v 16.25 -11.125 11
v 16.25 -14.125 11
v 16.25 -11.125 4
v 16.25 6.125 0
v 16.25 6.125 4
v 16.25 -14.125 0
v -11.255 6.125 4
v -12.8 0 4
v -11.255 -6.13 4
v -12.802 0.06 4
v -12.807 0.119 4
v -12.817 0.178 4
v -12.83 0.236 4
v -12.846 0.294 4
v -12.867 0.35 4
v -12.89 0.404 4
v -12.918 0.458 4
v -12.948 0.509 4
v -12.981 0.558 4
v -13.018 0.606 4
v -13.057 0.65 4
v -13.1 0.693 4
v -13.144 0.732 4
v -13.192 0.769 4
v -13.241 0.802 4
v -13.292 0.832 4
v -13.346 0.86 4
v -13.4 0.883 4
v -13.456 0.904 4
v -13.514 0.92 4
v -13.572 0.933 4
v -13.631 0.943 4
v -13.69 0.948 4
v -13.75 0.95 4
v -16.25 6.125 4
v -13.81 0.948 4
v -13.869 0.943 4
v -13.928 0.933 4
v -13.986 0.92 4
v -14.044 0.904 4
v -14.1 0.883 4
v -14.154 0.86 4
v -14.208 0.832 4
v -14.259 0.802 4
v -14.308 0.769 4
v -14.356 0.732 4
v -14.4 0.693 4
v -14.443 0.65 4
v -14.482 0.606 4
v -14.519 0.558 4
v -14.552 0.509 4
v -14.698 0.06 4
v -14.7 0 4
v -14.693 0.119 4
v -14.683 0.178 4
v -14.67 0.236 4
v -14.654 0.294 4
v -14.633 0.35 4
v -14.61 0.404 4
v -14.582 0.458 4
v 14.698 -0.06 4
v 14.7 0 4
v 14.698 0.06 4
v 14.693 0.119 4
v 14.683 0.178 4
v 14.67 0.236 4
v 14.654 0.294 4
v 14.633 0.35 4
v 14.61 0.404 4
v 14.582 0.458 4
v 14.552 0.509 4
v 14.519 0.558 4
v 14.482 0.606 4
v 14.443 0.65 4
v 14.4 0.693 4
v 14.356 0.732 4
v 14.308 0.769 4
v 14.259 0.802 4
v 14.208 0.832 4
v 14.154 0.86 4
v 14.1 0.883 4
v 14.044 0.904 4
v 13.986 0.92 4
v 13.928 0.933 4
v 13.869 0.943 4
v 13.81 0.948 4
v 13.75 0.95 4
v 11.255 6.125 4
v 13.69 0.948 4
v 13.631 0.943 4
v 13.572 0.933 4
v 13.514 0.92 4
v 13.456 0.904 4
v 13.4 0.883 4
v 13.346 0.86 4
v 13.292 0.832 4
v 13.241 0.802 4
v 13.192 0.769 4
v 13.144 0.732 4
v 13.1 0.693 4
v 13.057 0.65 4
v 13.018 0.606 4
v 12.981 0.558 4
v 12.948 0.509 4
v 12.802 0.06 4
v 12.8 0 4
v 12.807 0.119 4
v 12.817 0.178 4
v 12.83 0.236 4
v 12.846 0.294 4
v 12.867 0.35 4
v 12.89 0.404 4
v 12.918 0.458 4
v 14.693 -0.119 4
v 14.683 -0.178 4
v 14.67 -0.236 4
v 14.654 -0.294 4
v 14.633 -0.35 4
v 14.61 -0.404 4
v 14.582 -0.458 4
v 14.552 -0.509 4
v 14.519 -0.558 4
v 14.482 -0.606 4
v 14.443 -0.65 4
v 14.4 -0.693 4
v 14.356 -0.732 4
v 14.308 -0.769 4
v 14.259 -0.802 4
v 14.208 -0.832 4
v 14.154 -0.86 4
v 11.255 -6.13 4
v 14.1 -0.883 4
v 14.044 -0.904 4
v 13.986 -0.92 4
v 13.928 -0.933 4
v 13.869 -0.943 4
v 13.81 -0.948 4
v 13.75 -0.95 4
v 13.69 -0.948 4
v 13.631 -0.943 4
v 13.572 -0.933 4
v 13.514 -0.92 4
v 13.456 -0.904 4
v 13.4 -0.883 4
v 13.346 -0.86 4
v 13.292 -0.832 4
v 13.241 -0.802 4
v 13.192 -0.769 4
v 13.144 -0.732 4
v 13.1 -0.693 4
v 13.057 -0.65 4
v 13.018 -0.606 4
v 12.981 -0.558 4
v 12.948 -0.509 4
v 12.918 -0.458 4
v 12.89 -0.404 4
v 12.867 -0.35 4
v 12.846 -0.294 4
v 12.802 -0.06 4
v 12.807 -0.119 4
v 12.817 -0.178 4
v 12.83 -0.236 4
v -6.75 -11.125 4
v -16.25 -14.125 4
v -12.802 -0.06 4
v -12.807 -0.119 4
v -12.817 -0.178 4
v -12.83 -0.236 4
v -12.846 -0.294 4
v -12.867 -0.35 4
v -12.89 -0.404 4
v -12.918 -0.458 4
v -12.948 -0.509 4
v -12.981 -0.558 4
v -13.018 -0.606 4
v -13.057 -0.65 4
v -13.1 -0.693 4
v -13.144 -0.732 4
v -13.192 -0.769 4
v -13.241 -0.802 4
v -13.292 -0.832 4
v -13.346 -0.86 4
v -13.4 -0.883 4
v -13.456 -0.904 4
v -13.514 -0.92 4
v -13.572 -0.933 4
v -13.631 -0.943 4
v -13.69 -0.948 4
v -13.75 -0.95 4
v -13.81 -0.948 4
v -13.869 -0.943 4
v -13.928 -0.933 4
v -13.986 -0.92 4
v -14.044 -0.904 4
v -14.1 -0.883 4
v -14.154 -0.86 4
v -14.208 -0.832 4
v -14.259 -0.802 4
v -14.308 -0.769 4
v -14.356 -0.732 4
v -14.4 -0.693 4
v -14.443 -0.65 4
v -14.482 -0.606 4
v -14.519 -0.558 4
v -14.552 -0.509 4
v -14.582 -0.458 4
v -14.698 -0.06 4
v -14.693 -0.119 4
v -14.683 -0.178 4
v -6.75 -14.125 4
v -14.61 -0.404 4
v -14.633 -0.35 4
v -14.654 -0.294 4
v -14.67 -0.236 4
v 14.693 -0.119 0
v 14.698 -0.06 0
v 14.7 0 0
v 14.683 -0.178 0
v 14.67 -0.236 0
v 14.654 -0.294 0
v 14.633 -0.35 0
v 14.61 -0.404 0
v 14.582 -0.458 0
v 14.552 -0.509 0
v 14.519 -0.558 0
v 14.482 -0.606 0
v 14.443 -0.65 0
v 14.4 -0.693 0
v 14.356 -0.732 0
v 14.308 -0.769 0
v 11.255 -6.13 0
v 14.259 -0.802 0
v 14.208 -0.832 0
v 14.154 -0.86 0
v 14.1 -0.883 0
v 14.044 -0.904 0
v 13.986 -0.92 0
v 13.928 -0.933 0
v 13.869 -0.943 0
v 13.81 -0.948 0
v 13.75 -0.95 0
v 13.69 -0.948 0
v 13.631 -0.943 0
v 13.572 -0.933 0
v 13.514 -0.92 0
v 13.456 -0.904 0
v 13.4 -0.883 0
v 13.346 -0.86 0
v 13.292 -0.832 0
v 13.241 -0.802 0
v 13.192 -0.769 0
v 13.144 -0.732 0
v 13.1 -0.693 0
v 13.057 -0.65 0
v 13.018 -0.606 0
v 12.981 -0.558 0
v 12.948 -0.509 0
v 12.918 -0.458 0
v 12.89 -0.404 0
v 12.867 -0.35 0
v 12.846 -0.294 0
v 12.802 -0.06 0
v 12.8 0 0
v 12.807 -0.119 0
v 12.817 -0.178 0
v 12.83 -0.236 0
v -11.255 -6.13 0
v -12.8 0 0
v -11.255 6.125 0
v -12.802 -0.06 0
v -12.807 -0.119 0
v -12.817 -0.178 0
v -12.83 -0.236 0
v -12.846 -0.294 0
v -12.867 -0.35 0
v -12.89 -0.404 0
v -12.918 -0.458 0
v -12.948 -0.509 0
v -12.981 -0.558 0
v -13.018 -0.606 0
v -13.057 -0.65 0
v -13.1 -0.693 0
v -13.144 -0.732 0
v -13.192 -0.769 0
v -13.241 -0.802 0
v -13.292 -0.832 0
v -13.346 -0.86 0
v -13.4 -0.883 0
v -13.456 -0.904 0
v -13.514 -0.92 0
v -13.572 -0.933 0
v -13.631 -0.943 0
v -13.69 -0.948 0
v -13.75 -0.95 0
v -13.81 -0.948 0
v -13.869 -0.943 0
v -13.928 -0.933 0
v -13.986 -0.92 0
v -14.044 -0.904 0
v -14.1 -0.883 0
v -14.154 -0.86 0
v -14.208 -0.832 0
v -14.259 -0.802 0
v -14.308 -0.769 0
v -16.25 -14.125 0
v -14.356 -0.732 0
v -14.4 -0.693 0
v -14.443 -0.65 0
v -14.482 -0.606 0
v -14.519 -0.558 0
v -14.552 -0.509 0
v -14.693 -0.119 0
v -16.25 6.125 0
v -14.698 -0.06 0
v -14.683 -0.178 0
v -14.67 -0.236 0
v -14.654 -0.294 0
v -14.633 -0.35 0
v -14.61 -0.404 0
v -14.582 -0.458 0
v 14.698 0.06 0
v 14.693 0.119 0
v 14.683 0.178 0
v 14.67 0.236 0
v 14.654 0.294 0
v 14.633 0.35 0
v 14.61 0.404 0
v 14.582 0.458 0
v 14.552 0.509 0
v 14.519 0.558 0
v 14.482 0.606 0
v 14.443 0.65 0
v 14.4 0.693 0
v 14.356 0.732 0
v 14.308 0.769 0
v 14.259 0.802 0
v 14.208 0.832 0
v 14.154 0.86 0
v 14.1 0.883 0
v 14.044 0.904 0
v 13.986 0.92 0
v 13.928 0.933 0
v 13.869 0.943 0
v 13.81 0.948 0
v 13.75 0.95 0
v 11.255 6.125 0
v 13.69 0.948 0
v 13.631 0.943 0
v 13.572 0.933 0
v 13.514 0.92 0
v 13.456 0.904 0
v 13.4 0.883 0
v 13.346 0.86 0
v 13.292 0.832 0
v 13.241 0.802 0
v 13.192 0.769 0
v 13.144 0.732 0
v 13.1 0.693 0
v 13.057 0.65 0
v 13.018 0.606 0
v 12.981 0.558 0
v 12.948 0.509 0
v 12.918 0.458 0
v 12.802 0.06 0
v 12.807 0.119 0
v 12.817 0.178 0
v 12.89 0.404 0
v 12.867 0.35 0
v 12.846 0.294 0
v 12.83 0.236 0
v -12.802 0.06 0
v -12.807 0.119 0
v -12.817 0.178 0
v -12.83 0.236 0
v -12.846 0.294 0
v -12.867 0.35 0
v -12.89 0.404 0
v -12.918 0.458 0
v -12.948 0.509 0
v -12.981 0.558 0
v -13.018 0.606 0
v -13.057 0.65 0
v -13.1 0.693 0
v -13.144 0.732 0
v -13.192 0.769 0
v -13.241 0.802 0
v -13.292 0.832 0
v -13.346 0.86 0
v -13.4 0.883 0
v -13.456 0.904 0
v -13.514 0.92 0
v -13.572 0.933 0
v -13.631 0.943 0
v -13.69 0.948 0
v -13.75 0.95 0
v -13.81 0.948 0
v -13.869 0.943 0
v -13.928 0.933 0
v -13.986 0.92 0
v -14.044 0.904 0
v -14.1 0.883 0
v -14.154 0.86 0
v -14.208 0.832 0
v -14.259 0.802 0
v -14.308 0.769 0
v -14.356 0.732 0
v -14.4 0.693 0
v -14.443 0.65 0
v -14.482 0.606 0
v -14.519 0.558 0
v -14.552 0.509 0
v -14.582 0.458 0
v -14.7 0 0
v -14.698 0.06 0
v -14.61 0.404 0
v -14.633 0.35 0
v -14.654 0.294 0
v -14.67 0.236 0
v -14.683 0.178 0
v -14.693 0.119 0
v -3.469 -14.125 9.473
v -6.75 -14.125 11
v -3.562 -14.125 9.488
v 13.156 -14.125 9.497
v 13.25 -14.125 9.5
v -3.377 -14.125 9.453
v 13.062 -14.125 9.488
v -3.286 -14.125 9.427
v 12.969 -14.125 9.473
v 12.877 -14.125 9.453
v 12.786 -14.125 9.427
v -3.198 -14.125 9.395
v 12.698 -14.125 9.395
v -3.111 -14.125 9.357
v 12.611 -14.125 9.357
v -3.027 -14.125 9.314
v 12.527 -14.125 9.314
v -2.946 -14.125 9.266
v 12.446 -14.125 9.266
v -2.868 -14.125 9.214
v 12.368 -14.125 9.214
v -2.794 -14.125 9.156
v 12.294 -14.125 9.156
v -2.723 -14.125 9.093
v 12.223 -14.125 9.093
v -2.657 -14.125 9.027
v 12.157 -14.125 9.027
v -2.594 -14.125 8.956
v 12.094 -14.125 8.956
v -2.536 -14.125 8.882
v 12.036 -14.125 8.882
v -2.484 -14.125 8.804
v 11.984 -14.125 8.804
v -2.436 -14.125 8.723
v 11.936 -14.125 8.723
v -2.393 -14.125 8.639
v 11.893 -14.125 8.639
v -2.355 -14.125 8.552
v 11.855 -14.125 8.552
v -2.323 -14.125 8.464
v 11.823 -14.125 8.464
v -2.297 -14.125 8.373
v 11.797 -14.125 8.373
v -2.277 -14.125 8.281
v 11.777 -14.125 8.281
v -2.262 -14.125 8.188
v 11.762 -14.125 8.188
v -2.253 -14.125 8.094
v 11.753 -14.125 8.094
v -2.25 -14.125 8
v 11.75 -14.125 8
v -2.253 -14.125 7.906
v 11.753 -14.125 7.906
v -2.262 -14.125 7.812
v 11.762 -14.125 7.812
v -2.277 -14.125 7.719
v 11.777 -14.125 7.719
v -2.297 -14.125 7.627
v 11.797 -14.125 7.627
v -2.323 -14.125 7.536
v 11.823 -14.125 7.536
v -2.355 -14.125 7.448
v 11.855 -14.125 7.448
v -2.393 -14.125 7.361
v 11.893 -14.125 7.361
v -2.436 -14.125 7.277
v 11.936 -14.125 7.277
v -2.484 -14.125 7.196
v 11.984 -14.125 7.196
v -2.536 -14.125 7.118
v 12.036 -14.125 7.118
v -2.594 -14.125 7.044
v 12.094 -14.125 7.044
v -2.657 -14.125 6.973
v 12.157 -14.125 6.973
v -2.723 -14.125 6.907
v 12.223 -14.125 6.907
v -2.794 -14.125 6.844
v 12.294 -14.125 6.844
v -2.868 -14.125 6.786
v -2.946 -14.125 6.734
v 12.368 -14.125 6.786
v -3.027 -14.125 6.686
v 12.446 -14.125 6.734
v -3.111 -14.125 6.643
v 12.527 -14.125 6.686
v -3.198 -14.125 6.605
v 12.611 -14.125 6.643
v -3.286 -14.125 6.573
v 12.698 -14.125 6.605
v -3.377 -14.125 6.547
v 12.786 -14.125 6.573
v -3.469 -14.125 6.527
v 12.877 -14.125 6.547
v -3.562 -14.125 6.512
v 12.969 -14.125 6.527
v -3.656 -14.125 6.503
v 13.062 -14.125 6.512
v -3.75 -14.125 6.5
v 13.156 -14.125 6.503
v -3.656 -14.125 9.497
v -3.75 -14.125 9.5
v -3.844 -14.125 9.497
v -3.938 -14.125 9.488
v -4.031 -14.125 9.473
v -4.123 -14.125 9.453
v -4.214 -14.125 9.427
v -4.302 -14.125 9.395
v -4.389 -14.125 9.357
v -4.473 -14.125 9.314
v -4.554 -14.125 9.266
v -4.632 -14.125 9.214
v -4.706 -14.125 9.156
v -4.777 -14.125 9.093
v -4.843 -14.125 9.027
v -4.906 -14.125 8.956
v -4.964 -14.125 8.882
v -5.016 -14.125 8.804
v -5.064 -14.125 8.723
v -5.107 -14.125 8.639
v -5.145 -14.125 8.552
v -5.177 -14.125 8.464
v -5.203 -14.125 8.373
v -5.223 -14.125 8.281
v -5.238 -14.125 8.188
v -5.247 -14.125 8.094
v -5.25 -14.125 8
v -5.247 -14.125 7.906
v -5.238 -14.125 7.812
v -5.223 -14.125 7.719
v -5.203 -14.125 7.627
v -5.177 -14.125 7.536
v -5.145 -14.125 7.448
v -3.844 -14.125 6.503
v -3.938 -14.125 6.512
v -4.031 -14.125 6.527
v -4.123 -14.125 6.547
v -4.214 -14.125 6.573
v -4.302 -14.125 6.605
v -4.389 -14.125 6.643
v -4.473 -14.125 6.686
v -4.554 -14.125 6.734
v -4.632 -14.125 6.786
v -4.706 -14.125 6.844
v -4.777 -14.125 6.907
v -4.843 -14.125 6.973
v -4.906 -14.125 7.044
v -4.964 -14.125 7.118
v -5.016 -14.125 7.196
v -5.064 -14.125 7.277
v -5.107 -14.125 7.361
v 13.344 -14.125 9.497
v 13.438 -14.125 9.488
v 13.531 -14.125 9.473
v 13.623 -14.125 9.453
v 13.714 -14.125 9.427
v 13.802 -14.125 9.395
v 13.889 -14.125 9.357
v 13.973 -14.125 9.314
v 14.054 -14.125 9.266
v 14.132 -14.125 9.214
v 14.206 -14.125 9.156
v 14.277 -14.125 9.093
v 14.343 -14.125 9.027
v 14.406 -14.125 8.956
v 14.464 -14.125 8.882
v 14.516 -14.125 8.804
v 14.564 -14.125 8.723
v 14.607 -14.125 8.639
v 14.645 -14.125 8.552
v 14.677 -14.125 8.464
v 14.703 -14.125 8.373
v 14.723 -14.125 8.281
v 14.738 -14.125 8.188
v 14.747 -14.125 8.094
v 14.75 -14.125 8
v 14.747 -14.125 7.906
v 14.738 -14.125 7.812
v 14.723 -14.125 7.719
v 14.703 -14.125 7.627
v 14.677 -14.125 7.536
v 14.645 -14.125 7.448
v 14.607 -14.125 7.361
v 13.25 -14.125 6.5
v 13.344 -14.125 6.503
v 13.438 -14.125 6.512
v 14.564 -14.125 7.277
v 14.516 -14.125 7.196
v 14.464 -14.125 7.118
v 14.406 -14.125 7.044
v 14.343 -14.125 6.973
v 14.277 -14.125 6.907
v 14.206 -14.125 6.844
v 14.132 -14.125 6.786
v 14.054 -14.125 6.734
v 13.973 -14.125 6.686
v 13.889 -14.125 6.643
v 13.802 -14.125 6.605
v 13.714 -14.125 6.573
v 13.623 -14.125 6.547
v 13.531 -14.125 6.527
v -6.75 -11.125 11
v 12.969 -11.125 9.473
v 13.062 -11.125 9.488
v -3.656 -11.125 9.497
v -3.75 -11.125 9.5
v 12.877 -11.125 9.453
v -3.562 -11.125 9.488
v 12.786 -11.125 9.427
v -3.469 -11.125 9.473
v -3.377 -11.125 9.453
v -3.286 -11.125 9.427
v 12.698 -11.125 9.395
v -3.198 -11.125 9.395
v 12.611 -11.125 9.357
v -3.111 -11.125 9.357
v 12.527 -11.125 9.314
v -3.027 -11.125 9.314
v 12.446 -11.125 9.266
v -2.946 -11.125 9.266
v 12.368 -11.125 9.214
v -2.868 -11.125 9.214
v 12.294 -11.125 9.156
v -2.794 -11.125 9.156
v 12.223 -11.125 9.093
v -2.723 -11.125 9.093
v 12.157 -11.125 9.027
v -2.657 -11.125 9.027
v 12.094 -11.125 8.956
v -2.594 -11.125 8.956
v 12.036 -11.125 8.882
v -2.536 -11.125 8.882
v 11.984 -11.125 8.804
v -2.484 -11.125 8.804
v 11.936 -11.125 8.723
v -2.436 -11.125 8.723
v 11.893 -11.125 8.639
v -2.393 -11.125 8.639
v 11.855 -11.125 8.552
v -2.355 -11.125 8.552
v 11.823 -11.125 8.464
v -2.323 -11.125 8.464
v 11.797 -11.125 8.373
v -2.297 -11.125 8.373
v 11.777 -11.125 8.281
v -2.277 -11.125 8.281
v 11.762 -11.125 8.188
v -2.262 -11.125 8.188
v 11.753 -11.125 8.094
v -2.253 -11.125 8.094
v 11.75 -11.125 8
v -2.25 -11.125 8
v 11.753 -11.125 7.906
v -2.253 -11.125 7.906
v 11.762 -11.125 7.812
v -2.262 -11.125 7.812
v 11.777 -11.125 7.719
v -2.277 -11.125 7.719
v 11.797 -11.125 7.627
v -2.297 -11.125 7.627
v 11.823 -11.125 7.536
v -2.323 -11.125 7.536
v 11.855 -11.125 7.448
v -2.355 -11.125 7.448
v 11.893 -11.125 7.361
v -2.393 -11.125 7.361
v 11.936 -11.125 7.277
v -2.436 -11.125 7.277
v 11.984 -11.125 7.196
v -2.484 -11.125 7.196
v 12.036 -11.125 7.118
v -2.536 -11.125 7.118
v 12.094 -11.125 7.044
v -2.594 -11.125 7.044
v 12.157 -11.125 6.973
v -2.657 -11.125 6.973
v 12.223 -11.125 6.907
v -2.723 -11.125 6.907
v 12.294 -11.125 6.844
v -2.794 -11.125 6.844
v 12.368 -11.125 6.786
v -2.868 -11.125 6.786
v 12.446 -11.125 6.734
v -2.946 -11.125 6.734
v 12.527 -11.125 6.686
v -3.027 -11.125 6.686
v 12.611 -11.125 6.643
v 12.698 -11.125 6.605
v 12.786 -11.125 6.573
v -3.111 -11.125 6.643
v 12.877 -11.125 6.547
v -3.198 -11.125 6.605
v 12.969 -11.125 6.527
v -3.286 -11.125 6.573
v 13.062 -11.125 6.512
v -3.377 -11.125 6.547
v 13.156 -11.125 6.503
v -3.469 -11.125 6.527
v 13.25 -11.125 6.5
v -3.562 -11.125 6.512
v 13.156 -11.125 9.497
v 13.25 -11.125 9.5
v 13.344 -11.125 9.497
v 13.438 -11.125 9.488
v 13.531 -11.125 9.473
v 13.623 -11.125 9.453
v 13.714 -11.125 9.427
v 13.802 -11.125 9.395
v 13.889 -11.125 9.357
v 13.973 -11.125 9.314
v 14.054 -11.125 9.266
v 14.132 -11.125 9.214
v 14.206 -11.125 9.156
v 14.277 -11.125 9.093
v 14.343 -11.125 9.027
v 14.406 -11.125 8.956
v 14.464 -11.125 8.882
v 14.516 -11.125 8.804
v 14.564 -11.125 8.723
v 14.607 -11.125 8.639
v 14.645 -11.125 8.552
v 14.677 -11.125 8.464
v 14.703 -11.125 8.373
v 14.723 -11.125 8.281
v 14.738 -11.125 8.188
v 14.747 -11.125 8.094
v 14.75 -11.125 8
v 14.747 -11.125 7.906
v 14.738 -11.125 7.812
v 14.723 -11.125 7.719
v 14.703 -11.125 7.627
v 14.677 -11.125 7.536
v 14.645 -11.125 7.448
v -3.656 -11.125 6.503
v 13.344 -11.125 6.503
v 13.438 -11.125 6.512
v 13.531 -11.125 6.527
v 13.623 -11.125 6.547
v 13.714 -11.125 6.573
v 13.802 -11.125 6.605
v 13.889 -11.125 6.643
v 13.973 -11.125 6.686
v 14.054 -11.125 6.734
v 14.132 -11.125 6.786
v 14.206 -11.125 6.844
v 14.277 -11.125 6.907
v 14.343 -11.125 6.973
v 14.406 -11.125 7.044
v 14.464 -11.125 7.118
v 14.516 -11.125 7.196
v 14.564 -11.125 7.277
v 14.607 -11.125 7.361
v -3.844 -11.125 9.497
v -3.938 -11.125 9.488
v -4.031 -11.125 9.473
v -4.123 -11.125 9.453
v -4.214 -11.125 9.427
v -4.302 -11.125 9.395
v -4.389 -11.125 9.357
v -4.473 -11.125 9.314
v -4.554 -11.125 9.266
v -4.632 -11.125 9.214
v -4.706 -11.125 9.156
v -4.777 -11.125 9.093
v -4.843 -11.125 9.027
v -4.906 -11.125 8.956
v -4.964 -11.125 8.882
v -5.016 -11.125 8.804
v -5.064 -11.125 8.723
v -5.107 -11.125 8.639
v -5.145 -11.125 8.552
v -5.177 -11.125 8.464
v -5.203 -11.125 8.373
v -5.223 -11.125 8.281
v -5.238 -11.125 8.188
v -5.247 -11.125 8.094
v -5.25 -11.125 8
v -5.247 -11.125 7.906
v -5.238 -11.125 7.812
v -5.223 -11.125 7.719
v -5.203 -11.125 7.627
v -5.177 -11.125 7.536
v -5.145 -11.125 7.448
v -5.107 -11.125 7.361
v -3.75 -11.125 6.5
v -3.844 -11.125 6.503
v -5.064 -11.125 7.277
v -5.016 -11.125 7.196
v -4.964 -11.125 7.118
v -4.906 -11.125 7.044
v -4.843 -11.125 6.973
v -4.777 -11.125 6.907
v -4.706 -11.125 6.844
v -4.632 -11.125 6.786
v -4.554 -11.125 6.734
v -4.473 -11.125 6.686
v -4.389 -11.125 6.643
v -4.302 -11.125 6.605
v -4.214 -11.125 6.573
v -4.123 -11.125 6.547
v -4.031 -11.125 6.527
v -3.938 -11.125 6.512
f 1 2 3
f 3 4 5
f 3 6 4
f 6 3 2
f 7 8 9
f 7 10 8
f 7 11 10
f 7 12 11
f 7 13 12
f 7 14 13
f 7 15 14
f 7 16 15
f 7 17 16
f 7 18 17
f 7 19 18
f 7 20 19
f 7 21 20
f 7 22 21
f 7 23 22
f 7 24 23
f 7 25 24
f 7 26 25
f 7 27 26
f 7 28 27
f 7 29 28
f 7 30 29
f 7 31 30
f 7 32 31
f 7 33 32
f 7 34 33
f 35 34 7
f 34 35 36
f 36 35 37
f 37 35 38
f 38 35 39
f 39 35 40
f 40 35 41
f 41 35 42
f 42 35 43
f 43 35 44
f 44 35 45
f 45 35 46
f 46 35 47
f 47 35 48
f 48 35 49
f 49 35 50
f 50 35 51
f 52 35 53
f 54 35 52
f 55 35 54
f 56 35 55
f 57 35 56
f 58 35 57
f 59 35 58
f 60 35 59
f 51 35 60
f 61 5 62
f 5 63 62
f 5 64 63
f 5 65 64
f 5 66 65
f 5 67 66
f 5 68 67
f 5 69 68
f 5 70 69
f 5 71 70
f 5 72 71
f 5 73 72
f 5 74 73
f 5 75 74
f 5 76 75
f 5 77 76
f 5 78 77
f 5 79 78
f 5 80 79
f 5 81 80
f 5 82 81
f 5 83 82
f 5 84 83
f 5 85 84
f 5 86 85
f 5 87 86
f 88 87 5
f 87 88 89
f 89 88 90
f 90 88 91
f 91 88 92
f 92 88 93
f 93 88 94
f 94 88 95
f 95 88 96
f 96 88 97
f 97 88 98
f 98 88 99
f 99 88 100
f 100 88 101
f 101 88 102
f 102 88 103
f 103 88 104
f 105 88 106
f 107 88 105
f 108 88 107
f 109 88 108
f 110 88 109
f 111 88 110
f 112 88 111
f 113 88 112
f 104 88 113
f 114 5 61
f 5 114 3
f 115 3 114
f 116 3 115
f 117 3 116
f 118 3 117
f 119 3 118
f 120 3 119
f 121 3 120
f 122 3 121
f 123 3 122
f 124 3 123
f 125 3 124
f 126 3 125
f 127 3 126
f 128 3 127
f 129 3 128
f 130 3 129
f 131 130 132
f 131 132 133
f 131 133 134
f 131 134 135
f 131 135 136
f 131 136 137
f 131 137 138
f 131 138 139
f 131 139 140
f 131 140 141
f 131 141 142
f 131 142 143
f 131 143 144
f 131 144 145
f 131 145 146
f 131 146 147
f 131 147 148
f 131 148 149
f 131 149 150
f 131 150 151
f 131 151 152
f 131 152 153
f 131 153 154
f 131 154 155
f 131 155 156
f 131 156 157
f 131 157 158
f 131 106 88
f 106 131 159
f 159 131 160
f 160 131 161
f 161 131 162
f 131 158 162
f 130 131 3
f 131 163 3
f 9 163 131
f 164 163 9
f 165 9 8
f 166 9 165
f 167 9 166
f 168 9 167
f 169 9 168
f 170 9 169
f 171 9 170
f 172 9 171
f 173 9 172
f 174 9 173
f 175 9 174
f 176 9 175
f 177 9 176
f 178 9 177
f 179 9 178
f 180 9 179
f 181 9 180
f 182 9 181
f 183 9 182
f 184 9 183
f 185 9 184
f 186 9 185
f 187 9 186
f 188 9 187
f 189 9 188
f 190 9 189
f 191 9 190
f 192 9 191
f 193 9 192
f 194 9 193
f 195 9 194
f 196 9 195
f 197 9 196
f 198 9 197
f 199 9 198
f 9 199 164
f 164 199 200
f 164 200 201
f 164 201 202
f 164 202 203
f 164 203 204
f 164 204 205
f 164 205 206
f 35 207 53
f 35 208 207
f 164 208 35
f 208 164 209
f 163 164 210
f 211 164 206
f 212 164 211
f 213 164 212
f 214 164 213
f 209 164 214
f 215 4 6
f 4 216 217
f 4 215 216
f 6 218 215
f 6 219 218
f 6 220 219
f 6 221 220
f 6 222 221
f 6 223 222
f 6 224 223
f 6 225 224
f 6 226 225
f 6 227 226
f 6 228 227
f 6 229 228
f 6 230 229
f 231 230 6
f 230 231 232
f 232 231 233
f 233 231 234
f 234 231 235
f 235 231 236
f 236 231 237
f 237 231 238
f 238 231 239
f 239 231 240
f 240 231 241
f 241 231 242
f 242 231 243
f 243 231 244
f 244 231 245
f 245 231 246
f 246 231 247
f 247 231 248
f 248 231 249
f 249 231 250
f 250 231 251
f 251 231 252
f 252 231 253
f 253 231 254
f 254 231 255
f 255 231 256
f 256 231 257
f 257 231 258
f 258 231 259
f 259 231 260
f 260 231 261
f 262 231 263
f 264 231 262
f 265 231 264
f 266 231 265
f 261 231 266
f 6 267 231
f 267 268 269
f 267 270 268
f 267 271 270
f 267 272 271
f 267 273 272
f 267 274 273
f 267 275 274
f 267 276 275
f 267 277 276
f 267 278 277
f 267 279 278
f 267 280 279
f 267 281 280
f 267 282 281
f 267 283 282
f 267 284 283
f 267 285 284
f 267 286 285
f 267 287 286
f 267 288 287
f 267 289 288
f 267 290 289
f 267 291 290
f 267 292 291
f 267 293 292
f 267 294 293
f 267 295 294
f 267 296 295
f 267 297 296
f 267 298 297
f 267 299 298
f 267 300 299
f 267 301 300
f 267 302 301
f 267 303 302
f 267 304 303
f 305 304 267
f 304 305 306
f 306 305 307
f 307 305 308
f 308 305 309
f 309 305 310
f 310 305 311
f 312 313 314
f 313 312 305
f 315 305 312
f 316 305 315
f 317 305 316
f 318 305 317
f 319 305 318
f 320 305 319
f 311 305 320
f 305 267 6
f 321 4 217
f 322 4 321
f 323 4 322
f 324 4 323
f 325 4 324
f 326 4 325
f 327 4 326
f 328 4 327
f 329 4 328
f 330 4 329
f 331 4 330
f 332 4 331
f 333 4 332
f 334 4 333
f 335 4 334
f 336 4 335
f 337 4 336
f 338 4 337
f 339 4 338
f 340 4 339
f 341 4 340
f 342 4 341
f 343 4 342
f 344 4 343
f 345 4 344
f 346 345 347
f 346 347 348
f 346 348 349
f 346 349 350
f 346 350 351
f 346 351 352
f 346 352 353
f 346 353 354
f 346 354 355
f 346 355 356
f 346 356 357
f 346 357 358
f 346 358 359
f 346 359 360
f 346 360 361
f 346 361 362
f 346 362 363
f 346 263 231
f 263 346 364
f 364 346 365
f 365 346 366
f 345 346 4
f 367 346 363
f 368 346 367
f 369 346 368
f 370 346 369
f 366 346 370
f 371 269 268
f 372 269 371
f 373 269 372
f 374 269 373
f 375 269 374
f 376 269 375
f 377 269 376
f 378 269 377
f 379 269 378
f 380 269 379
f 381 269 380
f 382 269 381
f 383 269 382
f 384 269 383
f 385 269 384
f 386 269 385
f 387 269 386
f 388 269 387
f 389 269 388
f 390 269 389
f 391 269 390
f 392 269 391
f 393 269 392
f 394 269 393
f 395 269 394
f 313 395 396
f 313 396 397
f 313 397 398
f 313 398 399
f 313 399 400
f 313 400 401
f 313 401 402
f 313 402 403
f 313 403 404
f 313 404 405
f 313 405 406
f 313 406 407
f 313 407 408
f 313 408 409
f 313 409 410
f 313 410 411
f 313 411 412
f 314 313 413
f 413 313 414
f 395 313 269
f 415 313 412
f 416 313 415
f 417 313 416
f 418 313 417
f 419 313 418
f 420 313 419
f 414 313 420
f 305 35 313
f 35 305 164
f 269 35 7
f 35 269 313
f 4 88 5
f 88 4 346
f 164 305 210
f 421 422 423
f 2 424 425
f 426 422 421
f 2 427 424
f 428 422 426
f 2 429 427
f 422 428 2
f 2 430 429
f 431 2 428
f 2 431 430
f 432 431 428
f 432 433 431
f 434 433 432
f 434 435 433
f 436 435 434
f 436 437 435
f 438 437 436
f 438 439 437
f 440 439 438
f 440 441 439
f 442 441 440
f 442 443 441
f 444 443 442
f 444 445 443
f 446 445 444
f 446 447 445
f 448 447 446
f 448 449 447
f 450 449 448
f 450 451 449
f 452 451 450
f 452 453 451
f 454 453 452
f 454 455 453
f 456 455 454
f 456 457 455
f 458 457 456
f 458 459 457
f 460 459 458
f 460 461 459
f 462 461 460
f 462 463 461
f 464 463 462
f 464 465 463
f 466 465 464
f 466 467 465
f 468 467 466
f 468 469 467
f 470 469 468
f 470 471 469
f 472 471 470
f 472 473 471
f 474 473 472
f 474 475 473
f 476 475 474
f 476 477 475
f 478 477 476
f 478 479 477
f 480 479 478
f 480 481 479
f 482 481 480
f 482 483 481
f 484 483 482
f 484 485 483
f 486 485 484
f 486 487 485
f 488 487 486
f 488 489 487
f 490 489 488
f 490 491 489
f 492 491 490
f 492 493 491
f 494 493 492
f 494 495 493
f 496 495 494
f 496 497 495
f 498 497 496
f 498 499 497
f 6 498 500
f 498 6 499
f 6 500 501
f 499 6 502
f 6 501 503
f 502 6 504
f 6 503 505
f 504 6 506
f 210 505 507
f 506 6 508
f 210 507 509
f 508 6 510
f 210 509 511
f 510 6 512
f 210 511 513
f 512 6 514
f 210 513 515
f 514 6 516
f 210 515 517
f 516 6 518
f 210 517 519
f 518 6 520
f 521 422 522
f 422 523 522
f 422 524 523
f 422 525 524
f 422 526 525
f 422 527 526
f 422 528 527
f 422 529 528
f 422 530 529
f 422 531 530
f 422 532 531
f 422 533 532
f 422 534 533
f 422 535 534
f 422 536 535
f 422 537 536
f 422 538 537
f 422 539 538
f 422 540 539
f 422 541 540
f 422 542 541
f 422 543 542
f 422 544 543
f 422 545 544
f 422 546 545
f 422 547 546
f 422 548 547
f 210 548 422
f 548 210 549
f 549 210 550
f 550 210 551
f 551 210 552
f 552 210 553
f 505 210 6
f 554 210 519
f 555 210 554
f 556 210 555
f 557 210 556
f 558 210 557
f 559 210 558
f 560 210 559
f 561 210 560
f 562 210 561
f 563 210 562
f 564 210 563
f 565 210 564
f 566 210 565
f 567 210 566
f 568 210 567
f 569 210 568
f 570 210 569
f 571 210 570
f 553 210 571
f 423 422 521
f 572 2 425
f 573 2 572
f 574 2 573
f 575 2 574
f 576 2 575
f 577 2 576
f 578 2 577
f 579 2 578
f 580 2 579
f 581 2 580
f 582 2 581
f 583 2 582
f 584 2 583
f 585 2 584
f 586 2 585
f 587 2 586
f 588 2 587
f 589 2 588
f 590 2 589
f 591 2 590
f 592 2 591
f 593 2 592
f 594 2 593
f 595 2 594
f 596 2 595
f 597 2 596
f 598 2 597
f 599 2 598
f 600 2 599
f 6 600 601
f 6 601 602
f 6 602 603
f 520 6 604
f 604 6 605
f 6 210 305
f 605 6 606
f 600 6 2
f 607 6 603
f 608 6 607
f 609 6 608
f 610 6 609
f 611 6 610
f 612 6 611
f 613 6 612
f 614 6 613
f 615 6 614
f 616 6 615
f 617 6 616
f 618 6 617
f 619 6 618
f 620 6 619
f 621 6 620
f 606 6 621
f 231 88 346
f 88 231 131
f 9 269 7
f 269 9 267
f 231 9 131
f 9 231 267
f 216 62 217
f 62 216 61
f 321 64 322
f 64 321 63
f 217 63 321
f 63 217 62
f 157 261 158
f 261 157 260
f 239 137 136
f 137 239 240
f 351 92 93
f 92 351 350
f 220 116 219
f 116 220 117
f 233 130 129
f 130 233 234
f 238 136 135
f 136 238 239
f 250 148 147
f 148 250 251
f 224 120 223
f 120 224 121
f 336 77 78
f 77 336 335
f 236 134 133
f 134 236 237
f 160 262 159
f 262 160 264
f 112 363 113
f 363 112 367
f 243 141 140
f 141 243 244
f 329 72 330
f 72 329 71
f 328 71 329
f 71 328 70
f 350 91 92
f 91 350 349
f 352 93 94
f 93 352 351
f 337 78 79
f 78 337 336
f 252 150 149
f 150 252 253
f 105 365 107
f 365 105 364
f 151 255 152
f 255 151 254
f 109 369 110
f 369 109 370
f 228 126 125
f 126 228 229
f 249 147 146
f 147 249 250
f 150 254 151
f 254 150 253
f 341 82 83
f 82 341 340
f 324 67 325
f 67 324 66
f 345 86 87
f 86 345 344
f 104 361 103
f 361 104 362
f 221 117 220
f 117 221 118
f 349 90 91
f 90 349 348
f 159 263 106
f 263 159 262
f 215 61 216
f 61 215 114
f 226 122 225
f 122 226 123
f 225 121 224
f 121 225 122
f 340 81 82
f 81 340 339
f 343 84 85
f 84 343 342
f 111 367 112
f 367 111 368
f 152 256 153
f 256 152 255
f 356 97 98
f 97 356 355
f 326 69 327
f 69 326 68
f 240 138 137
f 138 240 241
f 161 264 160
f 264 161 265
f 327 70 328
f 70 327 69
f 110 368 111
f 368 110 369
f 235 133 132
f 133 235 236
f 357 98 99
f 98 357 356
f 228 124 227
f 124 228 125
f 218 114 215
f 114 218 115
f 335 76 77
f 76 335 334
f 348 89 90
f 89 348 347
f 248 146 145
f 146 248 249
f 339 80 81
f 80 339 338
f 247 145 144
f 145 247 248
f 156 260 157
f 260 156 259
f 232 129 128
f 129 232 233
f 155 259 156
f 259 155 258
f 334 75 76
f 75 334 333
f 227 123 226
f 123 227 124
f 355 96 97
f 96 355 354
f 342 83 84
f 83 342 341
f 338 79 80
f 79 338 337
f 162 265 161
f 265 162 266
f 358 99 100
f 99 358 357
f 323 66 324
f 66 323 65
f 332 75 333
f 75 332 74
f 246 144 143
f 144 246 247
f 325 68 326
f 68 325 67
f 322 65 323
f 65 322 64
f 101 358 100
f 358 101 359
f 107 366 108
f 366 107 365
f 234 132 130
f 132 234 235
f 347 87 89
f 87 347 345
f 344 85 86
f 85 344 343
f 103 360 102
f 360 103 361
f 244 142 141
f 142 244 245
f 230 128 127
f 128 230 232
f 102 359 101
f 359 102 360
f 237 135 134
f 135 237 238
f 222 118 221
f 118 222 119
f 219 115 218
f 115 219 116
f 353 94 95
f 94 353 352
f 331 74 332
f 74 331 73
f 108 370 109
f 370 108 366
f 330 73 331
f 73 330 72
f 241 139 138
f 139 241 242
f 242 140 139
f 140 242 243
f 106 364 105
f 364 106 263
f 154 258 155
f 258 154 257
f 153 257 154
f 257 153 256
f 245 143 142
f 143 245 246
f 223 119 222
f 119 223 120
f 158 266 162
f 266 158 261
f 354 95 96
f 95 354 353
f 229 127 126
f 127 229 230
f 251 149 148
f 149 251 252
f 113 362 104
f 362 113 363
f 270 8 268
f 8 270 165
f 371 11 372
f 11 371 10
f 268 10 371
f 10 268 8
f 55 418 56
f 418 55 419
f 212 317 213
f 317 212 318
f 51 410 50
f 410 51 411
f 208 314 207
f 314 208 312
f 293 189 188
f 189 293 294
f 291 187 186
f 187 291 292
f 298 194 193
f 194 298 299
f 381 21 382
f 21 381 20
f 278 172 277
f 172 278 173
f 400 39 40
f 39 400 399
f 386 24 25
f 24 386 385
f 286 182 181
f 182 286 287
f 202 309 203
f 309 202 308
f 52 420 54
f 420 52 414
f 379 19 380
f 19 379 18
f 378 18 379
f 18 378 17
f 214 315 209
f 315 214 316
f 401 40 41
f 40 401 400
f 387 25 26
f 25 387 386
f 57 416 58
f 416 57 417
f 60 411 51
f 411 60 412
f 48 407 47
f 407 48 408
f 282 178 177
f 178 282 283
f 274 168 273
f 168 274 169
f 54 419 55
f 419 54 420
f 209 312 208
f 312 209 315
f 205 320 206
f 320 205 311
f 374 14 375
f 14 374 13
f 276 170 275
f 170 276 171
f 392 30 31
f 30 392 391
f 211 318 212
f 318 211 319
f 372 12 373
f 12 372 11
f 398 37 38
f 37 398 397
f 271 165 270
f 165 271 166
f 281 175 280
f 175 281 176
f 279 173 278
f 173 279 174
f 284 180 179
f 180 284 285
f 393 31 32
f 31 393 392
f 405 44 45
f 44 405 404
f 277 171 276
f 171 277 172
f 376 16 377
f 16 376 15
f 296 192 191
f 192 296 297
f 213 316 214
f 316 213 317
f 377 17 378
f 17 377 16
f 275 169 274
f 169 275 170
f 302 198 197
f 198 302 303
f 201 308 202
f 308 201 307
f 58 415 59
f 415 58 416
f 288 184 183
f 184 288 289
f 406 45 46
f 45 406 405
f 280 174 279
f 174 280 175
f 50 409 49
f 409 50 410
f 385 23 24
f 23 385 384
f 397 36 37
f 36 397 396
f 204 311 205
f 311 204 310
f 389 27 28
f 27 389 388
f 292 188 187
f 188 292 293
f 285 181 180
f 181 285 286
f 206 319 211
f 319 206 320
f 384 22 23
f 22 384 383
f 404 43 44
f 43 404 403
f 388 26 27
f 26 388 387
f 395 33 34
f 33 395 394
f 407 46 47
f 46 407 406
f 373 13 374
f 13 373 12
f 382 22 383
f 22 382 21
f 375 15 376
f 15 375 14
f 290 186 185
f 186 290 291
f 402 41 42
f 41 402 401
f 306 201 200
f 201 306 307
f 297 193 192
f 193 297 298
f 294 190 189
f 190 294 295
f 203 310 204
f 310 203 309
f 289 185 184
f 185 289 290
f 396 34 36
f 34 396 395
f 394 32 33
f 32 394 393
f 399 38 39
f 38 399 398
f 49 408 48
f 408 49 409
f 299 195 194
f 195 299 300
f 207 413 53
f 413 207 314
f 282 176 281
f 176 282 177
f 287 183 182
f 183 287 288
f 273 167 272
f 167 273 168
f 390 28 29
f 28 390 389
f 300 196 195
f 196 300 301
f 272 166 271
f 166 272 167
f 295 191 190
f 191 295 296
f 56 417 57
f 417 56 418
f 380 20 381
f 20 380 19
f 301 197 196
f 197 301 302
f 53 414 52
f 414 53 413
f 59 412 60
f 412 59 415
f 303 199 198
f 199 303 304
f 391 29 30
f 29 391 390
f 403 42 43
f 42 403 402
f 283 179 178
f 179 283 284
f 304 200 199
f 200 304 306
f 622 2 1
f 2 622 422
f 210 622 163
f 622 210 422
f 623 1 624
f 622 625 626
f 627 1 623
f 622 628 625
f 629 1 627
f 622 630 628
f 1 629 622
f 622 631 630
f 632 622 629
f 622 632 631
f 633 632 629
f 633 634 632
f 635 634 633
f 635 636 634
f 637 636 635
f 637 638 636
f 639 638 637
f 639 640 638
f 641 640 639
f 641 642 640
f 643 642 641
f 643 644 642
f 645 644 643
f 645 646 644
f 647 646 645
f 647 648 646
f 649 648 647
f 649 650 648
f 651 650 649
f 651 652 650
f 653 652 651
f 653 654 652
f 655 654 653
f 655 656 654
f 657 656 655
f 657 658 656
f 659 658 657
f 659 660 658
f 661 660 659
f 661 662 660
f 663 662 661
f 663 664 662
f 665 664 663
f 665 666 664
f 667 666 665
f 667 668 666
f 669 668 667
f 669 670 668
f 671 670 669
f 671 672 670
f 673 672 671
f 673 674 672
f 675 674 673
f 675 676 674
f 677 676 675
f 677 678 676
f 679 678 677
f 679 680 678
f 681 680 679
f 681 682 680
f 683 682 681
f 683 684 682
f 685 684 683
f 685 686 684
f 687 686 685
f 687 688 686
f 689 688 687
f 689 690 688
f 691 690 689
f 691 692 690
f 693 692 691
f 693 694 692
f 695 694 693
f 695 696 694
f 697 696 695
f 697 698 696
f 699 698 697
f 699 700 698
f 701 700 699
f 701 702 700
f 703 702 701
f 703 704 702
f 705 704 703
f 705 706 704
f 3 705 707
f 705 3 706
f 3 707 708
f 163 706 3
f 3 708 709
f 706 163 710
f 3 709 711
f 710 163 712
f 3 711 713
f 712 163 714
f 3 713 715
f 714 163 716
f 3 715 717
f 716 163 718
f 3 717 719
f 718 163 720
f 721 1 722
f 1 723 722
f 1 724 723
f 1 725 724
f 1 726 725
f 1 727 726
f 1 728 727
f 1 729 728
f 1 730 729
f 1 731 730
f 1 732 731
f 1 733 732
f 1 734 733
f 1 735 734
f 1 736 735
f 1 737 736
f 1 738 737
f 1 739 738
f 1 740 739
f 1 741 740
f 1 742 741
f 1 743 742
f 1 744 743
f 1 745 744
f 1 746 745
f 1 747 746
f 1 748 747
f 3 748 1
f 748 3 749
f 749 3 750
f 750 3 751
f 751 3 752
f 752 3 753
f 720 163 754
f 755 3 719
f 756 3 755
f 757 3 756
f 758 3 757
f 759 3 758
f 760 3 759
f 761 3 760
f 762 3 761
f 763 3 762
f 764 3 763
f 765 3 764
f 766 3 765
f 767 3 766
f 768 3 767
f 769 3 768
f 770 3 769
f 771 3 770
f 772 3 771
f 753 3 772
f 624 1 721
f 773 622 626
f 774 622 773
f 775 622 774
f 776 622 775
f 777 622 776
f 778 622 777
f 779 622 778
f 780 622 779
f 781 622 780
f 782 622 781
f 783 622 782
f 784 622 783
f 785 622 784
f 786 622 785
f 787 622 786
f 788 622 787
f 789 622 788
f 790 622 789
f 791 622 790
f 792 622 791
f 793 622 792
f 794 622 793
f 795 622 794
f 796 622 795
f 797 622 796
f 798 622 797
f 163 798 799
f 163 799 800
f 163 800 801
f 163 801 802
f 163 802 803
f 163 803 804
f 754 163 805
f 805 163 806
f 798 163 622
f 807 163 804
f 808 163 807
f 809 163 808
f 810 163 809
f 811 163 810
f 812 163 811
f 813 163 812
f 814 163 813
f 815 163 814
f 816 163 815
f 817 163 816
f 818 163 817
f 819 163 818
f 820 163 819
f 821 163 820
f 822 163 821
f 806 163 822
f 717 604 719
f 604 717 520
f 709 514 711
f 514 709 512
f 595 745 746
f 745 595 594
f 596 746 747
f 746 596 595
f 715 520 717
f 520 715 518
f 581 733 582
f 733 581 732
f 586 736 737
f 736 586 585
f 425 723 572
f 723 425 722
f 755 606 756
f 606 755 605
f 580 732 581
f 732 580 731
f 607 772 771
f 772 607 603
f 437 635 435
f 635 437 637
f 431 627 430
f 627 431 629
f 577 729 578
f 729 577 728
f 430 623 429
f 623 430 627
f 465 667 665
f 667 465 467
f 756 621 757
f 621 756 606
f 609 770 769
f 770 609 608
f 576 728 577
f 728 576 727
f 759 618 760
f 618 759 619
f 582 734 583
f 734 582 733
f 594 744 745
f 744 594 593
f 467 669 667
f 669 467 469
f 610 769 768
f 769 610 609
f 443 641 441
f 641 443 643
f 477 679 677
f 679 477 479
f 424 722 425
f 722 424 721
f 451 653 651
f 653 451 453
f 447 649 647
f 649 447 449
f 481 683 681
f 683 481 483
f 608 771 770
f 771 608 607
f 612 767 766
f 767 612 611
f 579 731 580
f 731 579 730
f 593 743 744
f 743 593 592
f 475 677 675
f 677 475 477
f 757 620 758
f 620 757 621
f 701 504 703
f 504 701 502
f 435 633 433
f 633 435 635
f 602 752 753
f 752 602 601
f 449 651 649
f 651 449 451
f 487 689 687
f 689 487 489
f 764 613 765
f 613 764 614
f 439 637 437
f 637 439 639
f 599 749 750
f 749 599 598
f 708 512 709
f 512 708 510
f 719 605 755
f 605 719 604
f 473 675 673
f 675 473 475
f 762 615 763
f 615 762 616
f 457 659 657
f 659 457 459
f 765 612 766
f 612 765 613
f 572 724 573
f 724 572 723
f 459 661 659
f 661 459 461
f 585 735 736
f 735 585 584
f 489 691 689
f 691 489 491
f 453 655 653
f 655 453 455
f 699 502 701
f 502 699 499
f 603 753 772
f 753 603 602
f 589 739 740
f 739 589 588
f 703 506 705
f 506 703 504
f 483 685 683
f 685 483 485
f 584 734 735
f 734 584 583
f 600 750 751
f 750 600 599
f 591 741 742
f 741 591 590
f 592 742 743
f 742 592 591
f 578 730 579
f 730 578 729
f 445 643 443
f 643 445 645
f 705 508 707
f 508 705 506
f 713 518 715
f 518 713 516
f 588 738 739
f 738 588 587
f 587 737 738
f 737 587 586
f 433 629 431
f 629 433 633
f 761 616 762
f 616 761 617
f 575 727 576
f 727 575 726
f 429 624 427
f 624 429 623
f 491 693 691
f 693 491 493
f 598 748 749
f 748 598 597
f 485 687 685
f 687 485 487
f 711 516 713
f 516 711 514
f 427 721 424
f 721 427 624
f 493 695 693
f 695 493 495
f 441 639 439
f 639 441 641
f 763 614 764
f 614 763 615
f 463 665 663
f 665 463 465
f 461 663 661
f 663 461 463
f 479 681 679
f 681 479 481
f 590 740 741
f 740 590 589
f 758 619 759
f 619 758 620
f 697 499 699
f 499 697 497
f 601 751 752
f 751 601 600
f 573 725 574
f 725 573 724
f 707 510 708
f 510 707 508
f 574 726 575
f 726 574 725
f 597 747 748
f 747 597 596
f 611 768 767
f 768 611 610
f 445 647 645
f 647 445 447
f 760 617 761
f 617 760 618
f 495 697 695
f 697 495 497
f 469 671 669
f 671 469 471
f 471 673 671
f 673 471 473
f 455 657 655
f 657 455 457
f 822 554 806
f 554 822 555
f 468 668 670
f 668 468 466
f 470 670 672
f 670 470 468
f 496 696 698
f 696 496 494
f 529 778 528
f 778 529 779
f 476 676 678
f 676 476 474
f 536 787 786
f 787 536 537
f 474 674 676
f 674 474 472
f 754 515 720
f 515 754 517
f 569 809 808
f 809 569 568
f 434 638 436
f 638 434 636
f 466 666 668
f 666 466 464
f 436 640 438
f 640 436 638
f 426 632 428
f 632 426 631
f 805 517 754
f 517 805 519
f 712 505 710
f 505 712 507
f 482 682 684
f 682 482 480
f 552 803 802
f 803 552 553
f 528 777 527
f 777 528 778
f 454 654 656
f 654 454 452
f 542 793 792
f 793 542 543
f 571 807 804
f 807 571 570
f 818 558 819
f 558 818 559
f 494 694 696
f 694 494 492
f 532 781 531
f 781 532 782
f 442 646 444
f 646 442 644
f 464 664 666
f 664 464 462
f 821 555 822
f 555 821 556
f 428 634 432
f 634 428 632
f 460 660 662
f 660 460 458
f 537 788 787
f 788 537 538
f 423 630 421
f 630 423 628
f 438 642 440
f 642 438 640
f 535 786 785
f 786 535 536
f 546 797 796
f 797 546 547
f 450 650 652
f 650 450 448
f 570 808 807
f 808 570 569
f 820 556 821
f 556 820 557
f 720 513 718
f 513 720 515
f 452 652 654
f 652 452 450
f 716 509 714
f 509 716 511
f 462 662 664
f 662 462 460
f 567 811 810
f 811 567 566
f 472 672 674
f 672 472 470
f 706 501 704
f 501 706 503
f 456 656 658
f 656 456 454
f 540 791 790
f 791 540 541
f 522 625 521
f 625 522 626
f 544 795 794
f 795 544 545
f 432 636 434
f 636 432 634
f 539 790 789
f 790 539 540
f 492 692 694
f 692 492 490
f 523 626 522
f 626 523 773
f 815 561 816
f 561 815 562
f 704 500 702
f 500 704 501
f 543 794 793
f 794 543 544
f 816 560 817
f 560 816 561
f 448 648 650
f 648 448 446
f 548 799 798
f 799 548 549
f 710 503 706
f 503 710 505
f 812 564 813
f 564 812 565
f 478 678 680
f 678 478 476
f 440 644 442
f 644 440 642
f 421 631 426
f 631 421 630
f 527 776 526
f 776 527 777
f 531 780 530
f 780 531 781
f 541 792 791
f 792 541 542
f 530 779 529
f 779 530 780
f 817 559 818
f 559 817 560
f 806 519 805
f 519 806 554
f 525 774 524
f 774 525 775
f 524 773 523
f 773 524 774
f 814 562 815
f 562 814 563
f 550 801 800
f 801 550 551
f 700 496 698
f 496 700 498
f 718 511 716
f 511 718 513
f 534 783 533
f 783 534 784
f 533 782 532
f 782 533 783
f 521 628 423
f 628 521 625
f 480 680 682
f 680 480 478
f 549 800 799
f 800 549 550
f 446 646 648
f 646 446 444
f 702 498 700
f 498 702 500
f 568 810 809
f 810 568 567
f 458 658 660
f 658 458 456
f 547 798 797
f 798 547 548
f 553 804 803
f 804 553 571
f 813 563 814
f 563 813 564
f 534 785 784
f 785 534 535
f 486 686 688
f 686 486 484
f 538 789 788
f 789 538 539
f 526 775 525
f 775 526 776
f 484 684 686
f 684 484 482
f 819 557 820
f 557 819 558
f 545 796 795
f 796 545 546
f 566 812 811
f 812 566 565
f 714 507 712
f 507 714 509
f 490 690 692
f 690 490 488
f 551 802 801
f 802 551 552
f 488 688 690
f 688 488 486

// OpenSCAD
ServoDimensions = [22.5, 12.25];
WallThickness = 5;
ExtraOffset = 3;
Height = 4;
ServoScrewDistance = 27.5;
MountScrewDistance = 17;
MountScrewHeight = 8;

$fn=100;

difference() {
    translate([-ServoDimensions[0] / 2 - WallThickness, - ServoDimensions[1] / 2 - WallThickness - ExtraOffset])
    cube([ServoDimensions[0] + 2 * WallThickness, ServoDimensions[1] + WallThickness + ExtraOffset, Height]);
    cube([ServoDimensions[0] + 0.01, ServoDimensions[1] + 0.01, 20], center = true);
    
    // Screw holes for attaching to the servo
    translate([ServoScrewDistance / 2, 0, 0]) cylinder(20, r=0.95, center = true);
    translate([-ServoScrewDistance / 2, 0, 0]) cylinder(20, r=0.95, center = true);
}

translate([ServoDimensions[0] / 2 + WallThickness - MountScrewDistance / 2 - 3, 0, 0])
difference() {
    h = MountScrewHeight + 3;
    w = MountScrewDistance + 6;
    translate([0, -ServoDimensions[1]/2 - WallThickness - ExtraOffset/2, h/2])
    cube([w, ExtraOffset, h], center = true);
    
    translate([MountScrewDistance / 2, 0, MountScrewHeight])
    rotate([90, 0, 0])
    cylinder(50, r=1.5, center = true);

    translate([- MountScrewDistance/2, 0, MountScrewHeight])
    rotate([90, 0, 0])
    cylinder(50, r=1.5, center = true);
}
